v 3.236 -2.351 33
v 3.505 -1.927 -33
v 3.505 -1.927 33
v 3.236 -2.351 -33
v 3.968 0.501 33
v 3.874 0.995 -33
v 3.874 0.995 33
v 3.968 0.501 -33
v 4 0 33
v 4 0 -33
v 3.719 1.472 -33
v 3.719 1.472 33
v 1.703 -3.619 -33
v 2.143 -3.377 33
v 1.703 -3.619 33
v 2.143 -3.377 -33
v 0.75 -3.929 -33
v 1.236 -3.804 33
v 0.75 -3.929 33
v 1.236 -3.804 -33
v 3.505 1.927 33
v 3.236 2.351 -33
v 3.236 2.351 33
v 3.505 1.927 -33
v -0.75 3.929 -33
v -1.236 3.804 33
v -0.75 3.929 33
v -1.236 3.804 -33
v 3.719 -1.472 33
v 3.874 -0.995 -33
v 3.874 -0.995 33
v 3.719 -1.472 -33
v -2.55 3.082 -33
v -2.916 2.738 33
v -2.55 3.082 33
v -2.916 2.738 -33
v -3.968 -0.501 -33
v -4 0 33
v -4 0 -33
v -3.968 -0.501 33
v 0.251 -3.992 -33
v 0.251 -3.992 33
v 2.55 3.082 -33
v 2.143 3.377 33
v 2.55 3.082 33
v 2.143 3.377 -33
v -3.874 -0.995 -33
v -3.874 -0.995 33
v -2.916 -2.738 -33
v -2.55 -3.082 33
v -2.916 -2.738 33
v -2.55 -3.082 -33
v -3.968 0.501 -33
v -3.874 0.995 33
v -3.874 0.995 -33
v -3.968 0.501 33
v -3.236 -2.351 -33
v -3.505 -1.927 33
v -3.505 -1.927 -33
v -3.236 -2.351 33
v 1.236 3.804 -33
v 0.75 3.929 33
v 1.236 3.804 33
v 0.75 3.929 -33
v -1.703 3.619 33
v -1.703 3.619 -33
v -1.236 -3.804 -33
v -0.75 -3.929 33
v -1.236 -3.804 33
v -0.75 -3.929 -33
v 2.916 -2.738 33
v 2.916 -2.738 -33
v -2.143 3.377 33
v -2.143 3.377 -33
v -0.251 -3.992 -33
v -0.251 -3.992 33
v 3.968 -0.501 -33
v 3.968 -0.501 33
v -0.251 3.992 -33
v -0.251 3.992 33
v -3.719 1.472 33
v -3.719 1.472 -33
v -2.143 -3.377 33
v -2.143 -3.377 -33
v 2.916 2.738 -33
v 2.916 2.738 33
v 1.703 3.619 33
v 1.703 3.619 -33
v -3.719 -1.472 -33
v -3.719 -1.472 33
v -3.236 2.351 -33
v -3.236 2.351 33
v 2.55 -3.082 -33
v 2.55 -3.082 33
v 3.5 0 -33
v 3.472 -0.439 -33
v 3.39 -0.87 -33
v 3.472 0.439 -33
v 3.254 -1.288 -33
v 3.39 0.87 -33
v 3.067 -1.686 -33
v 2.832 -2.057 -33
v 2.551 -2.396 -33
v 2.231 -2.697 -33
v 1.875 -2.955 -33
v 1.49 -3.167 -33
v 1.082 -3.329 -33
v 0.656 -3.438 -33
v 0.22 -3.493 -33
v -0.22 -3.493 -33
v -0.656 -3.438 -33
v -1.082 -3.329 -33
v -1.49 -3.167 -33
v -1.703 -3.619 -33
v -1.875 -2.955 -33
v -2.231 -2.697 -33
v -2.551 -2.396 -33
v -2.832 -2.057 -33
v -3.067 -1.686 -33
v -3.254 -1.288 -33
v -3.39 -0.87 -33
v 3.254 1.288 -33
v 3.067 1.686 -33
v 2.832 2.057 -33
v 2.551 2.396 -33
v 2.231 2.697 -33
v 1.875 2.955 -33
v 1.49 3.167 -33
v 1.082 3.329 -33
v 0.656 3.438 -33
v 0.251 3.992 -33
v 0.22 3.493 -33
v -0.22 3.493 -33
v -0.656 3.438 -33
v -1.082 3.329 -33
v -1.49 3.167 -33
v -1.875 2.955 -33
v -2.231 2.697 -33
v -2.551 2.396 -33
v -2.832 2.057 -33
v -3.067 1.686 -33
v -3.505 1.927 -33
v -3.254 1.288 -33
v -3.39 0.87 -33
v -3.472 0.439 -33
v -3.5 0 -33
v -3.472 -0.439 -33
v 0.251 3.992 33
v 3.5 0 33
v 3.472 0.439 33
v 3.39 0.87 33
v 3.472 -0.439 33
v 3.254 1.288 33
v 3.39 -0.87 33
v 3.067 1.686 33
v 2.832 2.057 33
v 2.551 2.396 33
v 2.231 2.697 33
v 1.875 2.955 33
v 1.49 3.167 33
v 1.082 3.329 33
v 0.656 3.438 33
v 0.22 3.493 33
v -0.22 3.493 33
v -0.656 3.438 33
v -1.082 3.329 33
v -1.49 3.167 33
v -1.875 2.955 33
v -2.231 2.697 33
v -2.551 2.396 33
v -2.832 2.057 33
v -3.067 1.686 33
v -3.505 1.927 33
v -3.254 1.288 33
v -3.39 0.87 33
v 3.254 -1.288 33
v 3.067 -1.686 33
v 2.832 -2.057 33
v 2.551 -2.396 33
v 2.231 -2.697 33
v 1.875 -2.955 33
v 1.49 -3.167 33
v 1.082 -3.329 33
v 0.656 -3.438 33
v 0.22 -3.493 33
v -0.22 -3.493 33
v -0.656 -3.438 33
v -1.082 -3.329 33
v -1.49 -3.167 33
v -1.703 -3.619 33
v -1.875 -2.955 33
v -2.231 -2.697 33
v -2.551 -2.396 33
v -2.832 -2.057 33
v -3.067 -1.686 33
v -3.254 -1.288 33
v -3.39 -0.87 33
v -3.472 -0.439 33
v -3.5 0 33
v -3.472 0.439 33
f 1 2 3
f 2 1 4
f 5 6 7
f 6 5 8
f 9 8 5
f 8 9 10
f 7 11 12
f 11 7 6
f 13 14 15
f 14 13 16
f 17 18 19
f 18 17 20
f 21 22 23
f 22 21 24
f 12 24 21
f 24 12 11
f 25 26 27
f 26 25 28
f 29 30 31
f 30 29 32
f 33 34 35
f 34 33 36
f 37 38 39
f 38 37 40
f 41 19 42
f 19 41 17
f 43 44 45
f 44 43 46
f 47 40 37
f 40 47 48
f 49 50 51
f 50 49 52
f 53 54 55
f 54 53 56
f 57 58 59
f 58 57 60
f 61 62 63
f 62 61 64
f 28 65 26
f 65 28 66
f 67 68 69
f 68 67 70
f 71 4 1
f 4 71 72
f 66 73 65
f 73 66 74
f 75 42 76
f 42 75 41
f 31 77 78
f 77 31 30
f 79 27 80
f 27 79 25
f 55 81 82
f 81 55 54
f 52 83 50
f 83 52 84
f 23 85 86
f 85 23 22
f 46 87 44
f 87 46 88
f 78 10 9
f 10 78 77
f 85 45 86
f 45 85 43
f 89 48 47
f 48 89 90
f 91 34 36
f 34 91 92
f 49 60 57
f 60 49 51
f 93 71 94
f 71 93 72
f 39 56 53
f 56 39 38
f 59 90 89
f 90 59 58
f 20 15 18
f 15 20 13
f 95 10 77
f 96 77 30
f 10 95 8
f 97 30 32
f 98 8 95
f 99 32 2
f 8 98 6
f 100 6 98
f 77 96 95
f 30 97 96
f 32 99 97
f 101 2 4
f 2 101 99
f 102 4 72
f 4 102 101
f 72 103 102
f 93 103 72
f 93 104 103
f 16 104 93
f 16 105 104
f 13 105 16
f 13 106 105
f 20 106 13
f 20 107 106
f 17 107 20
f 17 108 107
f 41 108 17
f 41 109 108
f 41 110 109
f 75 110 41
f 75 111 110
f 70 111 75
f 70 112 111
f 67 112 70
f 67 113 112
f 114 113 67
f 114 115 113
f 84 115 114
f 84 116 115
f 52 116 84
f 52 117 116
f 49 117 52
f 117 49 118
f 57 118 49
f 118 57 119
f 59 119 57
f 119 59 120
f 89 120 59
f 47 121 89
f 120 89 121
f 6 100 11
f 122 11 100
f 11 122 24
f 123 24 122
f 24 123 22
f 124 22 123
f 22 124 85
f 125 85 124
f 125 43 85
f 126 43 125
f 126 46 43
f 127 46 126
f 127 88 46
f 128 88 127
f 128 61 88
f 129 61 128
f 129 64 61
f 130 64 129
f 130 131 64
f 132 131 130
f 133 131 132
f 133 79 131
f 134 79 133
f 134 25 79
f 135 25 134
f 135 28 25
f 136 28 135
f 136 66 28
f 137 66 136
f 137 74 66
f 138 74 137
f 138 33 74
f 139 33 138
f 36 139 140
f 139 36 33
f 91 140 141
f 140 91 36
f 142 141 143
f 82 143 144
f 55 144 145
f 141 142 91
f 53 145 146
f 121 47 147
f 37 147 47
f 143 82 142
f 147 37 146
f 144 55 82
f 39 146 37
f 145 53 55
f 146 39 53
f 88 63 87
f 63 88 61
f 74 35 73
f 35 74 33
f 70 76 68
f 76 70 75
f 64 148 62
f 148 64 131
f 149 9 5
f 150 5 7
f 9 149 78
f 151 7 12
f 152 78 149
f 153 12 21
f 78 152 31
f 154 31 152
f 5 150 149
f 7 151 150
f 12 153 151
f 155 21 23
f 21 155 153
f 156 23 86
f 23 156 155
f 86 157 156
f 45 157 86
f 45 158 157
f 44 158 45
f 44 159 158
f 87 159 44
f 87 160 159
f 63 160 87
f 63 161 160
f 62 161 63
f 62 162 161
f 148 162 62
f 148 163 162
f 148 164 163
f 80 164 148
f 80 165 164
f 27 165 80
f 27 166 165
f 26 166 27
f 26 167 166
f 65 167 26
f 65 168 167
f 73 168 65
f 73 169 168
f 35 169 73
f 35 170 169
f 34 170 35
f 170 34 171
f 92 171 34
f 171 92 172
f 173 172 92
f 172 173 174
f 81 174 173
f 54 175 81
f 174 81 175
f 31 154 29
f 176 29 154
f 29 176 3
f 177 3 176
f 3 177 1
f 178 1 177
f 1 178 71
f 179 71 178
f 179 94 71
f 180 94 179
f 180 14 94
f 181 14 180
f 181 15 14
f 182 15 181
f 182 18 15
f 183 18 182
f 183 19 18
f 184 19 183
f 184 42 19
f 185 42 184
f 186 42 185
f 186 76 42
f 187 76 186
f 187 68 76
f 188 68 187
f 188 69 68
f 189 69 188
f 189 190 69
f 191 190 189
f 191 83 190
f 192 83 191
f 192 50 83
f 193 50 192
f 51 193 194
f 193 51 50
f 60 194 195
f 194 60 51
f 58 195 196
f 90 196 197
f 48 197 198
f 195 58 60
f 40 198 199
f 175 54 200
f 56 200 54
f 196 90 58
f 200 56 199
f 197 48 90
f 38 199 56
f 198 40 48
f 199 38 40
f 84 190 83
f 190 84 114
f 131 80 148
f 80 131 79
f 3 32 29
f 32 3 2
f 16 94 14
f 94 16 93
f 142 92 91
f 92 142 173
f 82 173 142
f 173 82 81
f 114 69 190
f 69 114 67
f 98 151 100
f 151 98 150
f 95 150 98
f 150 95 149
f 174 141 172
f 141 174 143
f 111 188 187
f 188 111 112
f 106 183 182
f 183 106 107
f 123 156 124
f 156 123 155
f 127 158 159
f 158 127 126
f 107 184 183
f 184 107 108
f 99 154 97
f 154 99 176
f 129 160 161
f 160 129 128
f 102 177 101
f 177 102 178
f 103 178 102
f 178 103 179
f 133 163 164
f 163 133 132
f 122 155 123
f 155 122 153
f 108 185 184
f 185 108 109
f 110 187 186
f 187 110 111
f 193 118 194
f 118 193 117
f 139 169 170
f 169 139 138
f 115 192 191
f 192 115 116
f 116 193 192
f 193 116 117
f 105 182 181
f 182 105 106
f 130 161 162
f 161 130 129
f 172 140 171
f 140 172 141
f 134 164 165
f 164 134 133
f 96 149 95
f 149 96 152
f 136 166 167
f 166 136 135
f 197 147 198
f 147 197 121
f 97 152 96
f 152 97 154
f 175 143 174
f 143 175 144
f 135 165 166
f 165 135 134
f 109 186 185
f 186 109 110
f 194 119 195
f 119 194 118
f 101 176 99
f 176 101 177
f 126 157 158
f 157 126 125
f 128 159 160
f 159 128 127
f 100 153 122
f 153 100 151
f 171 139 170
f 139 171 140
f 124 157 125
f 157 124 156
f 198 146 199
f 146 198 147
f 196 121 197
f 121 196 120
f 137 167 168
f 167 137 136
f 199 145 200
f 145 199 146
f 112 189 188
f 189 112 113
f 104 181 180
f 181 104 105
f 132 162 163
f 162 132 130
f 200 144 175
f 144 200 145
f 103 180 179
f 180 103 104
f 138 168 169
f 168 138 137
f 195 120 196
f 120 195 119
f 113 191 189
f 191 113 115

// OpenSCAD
$fn = 50;


difference() {
	union() {
		translate(v = [0, 0, -33.0000000000]) {
			cylinder(h = 66, r = 4.0000000000);
		}
	}
	union() {
		translate(v = [0, 0, -100.0000000000]) {
			cylinder(h = 200, r = 3.5000000000);
		}
	}
}
